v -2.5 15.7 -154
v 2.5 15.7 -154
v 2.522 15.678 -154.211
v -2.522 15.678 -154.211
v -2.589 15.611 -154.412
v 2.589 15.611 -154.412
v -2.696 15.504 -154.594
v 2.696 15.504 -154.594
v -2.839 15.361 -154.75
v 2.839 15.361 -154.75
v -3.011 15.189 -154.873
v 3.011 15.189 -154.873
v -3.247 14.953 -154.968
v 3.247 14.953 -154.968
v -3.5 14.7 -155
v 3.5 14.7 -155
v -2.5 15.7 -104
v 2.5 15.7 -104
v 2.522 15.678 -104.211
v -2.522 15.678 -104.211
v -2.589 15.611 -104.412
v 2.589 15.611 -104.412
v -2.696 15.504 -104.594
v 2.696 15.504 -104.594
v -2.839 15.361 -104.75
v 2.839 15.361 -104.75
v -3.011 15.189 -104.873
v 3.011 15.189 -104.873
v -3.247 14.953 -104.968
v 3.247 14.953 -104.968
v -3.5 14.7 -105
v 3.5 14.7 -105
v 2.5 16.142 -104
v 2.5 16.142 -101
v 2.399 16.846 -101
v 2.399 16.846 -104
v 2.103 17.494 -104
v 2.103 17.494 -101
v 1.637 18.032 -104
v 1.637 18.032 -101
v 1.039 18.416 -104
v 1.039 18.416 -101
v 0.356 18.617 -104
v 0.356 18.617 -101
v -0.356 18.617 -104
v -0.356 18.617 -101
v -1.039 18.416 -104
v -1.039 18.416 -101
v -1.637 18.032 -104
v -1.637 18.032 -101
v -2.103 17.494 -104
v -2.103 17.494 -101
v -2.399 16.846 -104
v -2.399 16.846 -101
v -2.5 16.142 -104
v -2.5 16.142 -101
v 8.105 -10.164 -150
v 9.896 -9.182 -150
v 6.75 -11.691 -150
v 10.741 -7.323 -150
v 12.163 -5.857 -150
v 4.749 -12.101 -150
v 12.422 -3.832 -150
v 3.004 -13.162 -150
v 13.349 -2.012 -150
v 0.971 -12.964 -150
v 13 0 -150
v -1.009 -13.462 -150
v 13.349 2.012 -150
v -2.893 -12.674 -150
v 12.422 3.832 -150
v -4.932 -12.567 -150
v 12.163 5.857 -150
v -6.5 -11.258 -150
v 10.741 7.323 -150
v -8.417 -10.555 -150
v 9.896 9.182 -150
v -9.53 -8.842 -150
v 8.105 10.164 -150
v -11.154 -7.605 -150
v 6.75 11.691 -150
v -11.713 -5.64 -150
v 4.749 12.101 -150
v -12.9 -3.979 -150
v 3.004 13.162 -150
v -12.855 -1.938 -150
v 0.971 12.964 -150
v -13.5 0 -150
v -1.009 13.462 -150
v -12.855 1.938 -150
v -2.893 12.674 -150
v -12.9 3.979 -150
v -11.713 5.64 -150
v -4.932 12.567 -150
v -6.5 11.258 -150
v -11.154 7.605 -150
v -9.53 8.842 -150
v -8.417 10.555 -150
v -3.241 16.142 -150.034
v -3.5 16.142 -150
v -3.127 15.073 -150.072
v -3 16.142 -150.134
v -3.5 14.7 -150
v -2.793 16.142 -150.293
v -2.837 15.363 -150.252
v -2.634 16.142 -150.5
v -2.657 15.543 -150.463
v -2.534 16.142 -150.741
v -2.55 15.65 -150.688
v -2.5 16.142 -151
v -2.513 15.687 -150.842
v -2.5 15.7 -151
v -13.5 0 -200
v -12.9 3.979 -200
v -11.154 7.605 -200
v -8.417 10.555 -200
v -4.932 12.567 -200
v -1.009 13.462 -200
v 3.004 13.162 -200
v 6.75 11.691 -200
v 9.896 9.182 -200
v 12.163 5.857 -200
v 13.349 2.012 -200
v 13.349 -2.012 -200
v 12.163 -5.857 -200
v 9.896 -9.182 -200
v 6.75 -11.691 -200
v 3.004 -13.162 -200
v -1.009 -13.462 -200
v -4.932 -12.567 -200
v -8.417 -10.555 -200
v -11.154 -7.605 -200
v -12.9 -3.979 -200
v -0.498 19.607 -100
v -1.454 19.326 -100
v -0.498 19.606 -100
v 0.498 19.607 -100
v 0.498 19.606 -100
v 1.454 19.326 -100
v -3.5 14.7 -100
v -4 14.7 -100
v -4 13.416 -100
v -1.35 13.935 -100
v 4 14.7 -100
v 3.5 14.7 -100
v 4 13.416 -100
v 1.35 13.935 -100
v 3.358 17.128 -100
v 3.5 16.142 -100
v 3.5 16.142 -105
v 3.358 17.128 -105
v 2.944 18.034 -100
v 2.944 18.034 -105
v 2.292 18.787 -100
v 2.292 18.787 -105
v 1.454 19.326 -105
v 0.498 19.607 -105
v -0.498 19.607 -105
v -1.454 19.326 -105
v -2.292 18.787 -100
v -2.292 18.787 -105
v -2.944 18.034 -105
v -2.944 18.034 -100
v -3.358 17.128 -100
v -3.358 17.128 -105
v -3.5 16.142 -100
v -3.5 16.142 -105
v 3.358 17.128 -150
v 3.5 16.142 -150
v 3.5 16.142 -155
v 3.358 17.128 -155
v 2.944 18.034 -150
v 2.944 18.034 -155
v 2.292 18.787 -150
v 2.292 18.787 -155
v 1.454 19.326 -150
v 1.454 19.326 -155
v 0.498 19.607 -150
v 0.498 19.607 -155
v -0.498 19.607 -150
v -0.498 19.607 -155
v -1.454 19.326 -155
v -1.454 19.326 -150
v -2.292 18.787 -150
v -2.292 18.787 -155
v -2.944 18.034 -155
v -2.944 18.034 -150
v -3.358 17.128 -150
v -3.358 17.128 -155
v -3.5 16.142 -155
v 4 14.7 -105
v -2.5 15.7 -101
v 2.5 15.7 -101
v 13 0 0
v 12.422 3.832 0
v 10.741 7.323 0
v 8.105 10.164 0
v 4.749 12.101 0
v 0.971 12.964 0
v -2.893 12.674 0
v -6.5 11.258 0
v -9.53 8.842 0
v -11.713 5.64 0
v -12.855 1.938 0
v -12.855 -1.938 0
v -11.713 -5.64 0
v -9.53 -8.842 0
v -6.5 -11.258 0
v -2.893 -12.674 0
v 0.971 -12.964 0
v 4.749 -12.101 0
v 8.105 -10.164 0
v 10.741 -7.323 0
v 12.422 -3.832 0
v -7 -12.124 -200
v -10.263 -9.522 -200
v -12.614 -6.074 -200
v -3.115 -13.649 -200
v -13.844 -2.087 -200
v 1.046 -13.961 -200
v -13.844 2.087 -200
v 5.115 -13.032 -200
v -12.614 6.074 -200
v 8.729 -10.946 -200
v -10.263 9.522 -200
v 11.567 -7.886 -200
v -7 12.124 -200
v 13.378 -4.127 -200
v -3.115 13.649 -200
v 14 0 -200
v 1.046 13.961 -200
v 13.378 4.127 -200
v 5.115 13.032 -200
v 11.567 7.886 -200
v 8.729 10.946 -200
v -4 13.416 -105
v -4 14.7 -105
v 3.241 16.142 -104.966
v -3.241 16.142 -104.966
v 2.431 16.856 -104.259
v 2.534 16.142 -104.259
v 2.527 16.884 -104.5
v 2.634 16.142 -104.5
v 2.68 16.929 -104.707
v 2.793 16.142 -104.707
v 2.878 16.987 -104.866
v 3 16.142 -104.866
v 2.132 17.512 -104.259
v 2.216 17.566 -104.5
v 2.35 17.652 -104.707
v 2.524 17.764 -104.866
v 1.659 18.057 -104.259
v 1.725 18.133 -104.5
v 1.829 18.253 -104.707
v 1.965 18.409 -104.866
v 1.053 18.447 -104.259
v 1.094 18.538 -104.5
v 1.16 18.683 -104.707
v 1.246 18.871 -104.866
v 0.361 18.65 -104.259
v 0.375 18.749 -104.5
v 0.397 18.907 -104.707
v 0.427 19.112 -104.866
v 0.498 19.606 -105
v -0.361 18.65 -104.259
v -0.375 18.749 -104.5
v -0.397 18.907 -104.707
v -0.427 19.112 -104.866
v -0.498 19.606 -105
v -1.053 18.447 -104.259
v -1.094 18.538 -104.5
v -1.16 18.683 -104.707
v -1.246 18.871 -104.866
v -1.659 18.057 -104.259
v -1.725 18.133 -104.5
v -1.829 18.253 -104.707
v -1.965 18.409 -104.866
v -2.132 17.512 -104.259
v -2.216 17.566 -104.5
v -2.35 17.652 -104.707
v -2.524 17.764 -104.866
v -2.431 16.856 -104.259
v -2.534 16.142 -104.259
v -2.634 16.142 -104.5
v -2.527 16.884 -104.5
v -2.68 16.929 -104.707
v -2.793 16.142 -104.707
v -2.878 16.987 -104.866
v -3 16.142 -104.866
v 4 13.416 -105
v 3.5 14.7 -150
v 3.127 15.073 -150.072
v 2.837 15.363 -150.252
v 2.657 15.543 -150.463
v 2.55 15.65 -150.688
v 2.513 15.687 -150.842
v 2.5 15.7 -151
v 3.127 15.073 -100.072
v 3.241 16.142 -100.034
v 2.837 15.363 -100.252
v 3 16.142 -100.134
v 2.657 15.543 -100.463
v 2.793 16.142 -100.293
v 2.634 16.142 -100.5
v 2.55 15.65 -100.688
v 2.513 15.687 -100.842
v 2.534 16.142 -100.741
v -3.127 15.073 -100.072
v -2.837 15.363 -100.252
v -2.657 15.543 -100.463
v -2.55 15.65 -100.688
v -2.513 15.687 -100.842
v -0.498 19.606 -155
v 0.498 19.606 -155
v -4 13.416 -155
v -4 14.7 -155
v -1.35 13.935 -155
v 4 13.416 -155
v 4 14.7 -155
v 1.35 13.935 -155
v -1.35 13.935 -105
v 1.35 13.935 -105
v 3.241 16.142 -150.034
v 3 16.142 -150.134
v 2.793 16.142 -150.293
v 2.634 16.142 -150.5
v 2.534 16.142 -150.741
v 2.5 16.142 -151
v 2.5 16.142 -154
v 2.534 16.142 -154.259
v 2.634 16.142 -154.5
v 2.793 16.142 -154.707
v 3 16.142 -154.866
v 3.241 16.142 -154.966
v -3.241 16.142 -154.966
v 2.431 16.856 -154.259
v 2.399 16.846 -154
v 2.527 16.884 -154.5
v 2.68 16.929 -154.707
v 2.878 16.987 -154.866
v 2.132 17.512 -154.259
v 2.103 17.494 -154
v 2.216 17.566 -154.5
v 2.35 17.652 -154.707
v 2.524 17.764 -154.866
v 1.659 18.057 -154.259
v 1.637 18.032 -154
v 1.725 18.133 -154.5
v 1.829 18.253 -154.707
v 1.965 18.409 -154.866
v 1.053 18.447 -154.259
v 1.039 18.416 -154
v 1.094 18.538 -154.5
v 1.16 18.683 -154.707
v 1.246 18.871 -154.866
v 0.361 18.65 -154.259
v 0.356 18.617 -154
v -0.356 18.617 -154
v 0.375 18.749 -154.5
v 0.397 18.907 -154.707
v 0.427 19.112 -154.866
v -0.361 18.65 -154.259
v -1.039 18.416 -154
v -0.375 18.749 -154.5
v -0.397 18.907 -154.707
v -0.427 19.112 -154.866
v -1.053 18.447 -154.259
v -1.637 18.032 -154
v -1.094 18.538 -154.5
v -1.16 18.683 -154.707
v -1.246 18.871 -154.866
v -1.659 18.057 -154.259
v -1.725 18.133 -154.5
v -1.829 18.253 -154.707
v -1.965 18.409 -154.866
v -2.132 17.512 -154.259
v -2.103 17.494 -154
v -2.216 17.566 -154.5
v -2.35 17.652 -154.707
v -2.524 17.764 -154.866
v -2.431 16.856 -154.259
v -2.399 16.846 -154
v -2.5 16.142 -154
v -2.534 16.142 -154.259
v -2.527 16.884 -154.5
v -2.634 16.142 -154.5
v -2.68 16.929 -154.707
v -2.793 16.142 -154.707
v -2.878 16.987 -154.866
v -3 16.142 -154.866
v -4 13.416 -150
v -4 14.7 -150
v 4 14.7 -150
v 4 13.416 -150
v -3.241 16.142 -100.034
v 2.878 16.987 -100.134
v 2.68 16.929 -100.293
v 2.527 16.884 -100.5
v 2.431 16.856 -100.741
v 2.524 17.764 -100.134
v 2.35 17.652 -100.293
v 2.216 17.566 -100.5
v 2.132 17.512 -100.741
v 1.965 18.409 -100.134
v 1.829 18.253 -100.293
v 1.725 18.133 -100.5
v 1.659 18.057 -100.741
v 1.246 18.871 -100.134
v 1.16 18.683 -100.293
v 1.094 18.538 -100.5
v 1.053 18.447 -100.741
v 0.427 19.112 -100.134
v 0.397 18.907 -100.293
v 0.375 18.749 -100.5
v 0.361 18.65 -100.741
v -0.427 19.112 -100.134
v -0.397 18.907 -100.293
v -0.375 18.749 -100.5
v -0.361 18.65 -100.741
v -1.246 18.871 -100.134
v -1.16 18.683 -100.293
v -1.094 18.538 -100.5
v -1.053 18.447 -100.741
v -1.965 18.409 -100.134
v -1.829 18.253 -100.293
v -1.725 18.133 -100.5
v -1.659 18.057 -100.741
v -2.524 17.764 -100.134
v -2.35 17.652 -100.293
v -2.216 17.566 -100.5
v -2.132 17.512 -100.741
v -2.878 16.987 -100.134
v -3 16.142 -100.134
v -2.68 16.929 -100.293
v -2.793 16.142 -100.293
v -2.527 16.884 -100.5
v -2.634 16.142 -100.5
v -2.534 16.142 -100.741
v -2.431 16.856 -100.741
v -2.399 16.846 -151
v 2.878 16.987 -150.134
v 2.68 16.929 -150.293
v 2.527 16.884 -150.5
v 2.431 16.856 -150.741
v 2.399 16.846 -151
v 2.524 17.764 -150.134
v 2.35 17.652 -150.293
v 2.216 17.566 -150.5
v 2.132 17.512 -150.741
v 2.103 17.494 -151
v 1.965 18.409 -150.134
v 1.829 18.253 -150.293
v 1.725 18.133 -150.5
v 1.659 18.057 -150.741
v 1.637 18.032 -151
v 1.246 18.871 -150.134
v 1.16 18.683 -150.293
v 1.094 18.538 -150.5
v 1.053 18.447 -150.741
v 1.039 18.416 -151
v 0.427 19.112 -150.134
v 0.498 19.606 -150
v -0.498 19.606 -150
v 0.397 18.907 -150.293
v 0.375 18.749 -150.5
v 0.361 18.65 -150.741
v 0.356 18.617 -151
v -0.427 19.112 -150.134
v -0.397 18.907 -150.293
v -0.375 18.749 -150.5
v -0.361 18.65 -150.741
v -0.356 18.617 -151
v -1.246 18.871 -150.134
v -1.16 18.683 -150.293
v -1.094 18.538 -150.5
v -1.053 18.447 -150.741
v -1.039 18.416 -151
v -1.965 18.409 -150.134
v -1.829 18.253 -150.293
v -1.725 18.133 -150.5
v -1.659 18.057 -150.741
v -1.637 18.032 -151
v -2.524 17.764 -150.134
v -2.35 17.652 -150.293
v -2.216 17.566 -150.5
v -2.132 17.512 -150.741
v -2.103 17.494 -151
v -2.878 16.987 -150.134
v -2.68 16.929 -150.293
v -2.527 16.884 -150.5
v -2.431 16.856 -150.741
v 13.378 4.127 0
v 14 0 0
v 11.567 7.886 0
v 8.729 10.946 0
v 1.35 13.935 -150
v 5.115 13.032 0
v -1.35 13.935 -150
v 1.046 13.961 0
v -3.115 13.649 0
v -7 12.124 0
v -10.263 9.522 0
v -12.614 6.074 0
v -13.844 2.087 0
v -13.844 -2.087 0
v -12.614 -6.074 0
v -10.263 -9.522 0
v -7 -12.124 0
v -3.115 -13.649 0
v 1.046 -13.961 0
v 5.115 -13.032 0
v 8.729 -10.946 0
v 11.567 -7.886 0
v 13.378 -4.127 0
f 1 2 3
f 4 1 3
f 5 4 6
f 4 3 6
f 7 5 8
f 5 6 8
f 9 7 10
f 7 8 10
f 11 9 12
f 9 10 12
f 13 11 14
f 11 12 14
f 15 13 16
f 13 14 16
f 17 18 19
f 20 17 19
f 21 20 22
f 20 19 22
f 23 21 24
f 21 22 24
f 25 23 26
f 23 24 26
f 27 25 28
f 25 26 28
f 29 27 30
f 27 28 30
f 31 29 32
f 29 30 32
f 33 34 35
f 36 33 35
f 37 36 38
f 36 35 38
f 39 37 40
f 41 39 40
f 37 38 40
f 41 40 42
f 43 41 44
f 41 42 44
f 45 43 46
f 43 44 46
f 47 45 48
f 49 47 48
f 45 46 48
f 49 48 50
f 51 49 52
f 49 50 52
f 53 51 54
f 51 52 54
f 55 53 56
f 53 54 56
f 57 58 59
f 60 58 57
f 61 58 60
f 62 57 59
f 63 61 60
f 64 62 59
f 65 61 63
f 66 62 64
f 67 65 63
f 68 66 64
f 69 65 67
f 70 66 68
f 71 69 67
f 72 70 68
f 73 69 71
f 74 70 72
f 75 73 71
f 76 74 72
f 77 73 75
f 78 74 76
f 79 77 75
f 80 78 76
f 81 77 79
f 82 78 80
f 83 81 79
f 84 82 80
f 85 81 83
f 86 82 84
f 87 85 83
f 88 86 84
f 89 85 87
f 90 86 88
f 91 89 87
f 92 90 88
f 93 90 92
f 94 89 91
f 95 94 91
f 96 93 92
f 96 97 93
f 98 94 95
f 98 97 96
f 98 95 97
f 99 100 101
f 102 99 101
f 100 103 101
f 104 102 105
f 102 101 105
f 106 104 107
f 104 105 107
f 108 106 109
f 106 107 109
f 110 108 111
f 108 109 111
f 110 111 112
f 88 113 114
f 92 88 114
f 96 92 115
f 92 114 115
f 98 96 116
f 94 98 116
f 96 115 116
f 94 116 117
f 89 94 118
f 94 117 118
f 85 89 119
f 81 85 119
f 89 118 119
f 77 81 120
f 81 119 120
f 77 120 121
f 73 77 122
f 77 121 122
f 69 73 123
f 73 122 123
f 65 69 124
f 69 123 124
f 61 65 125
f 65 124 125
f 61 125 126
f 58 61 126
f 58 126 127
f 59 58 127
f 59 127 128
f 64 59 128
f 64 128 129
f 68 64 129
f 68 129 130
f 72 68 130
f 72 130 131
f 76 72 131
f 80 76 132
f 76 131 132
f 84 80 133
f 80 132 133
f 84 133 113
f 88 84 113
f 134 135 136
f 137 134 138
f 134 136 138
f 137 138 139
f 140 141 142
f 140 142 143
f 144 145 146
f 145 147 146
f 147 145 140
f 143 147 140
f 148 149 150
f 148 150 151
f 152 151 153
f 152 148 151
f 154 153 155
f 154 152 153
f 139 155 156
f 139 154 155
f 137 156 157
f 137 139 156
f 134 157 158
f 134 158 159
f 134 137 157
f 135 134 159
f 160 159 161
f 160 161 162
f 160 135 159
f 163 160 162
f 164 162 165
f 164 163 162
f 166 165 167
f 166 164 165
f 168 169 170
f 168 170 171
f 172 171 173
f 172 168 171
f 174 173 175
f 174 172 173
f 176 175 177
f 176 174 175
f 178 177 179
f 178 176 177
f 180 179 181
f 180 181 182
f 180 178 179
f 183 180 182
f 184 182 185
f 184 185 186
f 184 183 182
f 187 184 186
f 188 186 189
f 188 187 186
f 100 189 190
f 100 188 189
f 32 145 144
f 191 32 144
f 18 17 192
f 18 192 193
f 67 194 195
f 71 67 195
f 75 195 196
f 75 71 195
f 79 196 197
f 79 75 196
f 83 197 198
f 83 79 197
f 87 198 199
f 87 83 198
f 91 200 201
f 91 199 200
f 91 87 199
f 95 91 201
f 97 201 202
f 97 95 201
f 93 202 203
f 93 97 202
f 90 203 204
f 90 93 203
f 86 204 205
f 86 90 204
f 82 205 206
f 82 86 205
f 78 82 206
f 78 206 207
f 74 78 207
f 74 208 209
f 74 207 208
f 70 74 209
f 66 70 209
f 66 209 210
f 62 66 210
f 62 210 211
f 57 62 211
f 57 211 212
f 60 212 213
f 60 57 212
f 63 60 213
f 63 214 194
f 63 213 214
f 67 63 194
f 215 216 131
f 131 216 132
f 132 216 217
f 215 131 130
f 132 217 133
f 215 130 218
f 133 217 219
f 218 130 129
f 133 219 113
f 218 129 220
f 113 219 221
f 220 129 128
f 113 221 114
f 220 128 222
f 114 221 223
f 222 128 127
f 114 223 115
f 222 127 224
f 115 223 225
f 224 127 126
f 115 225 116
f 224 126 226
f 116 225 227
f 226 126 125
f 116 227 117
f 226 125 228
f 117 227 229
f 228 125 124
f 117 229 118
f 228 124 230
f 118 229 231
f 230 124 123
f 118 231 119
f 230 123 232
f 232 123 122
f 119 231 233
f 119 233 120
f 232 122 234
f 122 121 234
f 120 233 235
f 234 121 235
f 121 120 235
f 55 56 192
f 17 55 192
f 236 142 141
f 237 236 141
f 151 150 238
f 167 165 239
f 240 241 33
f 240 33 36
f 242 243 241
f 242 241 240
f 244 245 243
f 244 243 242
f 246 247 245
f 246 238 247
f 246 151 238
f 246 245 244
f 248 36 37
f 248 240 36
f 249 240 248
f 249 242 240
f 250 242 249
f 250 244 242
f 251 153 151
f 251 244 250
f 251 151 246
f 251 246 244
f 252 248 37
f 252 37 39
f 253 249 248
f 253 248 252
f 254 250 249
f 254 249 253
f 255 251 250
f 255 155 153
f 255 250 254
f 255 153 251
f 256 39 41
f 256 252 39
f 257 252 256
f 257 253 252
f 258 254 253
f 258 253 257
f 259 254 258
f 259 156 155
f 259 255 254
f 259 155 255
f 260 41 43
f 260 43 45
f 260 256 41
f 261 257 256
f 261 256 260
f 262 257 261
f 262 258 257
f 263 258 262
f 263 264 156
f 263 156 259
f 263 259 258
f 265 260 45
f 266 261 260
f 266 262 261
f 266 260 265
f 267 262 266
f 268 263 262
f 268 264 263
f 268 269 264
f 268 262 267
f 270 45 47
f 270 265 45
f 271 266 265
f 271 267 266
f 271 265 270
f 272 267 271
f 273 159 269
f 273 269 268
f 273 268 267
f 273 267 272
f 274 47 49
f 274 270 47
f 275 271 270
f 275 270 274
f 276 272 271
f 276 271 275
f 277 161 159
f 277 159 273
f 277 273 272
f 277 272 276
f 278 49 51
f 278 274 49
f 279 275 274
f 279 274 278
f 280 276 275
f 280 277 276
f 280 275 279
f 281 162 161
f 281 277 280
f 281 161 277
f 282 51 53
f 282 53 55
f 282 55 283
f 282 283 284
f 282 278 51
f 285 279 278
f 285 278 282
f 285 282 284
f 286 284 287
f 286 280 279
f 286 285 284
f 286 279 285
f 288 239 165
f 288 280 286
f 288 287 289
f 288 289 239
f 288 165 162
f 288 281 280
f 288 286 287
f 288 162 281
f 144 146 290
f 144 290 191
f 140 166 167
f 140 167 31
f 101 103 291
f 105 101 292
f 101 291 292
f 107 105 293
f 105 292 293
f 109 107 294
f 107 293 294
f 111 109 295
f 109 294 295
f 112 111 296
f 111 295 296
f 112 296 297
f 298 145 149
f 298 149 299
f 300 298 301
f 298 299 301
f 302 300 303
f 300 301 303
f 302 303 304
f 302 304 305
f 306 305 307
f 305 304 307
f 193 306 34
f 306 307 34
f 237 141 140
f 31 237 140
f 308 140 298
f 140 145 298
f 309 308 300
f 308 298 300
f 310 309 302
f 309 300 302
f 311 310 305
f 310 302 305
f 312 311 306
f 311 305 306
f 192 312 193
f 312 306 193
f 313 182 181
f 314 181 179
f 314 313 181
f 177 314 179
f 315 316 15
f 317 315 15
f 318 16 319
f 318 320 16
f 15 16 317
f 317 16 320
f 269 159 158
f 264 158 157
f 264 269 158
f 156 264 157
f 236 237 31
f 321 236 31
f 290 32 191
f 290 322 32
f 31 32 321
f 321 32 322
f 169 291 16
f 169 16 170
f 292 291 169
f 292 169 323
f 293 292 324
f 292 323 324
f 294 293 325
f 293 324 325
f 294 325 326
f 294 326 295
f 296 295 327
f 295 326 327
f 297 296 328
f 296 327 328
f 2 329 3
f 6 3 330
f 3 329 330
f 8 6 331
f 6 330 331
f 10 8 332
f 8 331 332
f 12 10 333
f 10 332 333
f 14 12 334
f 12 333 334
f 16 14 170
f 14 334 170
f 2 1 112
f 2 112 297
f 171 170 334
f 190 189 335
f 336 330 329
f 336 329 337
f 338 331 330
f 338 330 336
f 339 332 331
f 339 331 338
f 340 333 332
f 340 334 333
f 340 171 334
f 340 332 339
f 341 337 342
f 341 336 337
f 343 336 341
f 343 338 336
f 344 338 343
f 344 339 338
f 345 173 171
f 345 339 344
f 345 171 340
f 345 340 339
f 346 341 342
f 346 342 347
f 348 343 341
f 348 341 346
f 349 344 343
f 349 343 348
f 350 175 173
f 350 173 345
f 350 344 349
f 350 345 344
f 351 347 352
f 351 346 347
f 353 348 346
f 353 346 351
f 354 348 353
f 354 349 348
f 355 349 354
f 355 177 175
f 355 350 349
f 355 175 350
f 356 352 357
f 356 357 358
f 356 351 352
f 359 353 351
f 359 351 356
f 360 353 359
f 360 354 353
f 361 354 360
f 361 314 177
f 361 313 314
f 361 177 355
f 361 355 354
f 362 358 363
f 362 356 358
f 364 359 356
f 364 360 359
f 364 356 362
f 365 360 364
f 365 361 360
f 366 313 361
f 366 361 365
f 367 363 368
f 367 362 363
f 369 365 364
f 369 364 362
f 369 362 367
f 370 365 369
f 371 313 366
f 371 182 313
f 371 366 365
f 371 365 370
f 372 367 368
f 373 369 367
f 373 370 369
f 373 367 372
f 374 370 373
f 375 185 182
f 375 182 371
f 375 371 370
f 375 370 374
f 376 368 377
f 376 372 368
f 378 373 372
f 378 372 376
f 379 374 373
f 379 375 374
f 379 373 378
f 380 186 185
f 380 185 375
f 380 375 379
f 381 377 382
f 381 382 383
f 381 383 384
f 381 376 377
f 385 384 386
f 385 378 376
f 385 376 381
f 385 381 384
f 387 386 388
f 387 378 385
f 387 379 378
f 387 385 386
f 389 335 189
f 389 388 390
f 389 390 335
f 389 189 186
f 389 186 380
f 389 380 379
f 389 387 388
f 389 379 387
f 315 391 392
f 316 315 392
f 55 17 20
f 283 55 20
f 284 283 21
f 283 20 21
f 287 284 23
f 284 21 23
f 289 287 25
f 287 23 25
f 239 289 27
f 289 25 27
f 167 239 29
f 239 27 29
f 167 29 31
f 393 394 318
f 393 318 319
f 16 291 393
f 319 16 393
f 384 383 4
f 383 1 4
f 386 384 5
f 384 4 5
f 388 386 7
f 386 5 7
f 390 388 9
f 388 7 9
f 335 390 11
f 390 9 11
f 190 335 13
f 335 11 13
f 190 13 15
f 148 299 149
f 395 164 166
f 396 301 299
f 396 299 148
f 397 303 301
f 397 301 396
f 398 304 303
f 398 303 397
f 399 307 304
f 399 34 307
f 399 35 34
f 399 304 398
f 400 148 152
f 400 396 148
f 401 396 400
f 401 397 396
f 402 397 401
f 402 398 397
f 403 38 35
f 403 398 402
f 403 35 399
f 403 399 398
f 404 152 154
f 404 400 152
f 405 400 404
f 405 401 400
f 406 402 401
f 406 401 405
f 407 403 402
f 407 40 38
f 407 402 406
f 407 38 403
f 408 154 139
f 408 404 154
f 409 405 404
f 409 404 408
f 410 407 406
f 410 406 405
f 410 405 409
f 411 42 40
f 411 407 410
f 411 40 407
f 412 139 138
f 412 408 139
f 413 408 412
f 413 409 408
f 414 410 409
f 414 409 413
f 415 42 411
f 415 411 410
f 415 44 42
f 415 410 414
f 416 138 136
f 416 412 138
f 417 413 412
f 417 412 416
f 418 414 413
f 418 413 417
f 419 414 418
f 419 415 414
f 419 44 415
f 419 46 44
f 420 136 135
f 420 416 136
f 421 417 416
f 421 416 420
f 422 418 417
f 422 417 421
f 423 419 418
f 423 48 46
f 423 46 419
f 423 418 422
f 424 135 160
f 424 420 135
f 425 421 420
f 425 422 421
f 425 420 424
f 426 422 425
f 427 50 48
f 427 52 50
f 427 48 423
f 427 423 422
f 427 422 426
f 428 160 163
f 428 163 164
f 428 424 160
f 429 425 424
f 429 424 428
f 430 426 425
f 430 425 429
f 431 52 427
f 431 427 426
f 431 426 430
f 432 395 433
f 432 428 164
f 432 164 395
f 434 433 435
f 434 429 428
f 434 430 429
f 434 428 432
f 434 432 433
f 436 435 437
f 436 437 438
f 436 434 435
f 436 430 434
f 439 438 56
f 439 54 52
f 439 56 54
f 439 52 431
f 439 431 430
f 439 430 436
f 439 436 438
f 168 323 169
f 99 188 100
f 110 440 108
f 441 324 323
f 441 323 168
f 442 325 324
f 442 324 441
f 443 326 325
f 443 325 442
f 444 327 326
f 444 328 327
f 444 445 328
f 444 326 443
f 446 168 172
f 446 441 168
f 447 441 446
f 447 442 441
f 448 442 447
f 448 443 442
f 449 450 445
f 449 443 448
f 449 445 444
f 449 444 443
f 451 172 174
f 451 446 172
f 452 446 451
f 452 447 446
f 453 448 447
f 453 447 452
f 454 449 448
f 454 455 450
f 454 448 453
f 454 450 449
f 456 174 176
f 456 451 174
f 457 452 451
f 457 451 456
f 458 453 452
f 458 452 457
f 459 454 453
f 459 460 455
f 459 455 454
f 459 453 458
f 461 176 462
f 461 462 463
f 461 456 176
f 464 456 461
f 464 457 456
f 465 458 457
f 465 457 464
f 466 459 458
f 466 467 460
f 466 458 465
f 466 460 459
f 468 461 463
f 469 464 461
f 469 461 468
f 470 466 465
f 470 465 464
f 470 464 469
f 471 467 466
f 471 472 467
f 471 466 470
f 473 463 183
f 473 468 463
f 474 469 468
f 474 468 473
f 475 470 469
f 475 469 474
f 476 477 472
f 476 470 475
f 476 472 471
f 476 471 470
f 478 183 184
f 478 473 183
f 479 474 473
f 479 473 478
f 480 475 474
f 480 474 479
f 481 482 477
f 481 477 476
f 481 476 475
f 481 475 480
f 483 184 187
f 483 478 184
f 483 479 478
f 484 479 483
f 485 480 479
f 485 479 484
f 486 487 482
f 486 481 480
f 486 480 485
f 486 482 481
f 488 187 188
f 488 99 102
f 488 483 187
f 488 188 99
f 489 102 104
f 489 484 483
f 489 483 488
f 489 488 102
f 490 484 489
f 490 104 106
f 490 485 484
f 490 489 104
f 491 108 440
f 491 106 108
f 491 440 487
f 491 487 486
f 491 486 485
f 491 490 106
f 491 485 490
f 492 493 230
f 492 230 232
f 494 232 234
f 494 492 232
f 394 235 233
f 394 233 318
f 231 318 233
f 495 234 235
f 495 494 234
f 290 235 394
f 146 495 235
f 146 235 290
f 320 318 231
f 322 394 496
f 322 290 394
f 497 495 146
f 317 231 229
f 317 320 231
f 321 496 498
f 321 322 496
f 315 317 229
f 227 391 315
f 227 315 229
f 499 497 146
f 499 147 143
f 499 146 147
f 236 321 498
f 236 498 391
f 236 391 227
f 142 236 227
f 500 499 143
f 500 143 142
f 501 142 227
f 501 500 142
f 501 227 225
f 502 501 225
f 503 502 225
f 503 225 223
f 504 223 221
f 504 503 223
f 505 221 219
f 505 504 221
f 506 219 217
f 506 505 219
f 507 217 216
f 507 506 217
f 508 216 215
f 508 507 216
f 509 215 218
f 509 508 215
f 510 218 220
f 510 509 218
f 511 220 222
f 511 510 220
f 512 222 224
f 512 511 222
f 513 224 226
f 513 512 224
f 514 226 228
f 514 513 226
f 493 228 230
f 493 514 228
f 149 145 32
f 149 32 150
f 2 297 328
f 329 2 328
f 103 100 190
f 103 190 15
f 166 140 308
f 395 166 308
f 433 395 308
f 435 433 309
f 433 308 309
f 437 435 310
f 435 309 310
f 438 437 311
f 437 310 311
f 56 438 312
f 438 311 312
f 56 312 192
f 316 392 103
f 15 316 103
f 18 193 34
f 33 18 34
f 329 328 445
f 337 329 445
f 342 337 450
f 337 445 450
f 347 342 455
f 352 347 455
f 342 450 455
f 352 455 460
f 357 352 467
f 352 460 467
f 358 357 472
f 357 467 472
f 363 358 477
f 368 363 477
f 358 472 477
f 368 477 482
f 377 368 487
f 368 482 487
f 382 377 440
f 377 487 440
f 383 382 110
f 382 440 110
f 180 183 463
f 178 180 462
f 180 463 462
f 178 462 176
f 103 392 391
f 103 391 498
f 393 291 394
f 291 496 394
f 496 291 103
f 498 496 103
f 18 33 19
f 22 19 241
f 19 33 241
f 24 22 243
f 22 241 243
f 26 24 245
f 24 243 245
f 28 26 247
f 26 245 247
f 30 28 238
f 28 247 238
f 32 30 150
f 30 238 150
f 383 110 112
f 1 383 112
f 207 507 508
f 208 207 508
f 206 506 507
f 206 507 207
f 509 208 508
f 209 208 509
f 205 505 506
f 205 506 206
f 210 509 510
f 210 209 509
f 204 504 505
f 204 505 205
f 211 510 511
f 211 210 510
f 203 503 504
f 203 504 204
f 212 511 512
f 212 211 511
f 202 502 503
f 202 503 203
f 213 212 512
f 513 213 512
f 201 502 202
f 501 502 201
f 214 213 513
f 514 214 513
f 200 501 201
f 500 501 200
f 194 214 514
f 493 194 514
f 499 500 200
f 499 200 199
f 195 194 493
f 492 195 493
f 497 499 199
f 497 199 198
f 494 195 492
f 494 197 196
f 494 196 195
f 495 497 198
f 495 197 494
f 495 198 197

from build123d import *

# Parameters (mm, degrees)
CROQUIS1_R                 = 14
SALIENTE_EXTRUIR1_DEPTH    = 200
CORTAR_EXTRUIR1_DEPTH      = 201.977610693
CORTAR_EXTRUIR1_DEPTH_BACK = 201.977610693
CROQUIS2_R                 = 13
CROQUIS3_W                 = 8
CROQUIS3_H                 = 1.4
SALIENTE_EXTRUIR2_DEPTH    = 5
EXTRUIR_L_MINA2_DEPTH      = 5
CROQUIS6_W                 = 5
CROQUIS6_H                 = 5
SALIENTE_EXTRUIR3_DEPTH    = 1
REDONDEO1_R                = 1
MATRIZL2_COUNT             = 2
MATRIZL2_PITCH             = 50
REDONDEO1_OF_MATRIZL2_R    = 1
CROQUIS8_R                 = 13.5
CORTAR_EXTRUIR2_DEPTH      = 50


with BuildPart() as part:
    # Croquis1 → Saliente-Extruir1 (new body)
    with BuildSketch(Plane.XY):
        Circle(CROQUIS1_R)
    extrude(amount=-SALIENTE_EXTRUIR1_DEPTH)

    # Croquis2 → Cortar-Extruir1 (cut, two sides: drawn at the far end of the back side and taken through both)
    with BuildSketch(Plane.XY.offset(-CORTAR_EXTRUIR1_DEPTH_BACK)):
        Circle(CROQUIS2_R)
    extrude(amount=CORTAR_EXTRUIR1_DEPTH + CORTAR_EXTRUIR1_DEPTH_BACK, mode=Mode.SUBTRACT)

    # Croquis3 → Saliente-Extruir2 (add)
    with BuildSketch(Plane.XY.offset(-100)):
        with Locations((0, 14)):
            Rectangle(CROQUIS3_W, CROQUIS3_H)
    saliente_extruir2 = extrude(amount=-SALIENTE_EXTRUIR2_DEPTH)

    # Croquis5 → Extruir-Lámina2 (add)
    with BuildSketch(Plane.XY.offset(-100)):
        with BuildLine():
            Line((-3.5, 16.142129337), (-3.5, 15.7))
            Line((-3.5, 15.7), (-3.5, 13.7))
            Line((-3.5, 13.7), (3.5, 13.7))
            Line((3.5, 13.7), (3.5, 16.142129337))
            ThreePointArc((3.5, 16.142129337), (0, 19.642129337), (-3.5, 16.142129337))
        make_face()
        with BuildLine():
            Line((-2.5, 16.142129337), (-2.5, 15.7))
            Line((-2.5, 15.7), (-2.5, 14.7))
            Line((-2.5, 14.7), (2.5, 14.7))
            Line((2.5, 14.7), (2.5, 16.142129337))
            ThreePointArc((2.5, 16.142129337), (0, 18.642129337), (-2.5, 16.142129337))
        make_face(mode=Mode.SUBTRACT)
    extruir_l_mina2 = extrude(amount=-EXTRUIR_L_MINA2_DEPTH)

    # Croquis6 → Saliente-Extruir3 (add)
    with BuildSketch(Plane(origin=(0, 14.7, 0), x_dir=(1, 0, 0), z_dir=(0, 1, 0))):
        with Locations((0, 102.5)):
            Rectangle(CROQUIS6_W, CROQUIS6_H)
    saliente_extruir3 = extrude(amount=SALIENTE_EXTRUIR3_DEPTH)

    # Redondeo1
    redondeo1_edges = [part.edges().sort_by_distance(p)[0] for p in [
        (-2.5, 15.921064668, -100),
        (0, 18.642129337, -100),
        (0, 18.642129337, -105),
        (-2.5, 15.921064668, -105),
        (2.5, 15.921064668, -105),
        (2.5, 15.921064668, -100),
        (0, 15.7, -105),
        (0, 15.7, -100),
    ]]
    fillet(redondeo1_edges, radius=REDONDEO1_R - 0.0001)  # a hair under: the kernel refuses the full size

    # MatrizL2: Saliente-Extruir2, Extruir-Lámina2, Saliente-Extruir3 ×2
    with Locations(*[(0, 0, -i * MATRIZL2_PITCH) for i in range(1, MATRIZL2_COUNT)]):
        add(saliente_extruir2)
        add(extruir_l_mina2)
        add(saliente_extruir3)

    # Redondeo1 of MatrizL2
    redondeo1_of_matrizl2_edges = [part.edges().sort_by_distance(p)[0] for p in [
        (-2.5, 15.921064668, -150),
        (0, 18.642129337, -150),
        (0, 18.642129337, -155),
        (-2.5, 15.921064668, -155),
        (2.5, 15.921064668, -155),
        (2.5, 15.921064668, -150),
        (0, 15.7, -155),
        (0, 15.7, -150),
    ]]
    fillet(redondeo1_of_matrizl2_edges, radius=REDONDEO1_OF_MATRIZL2_R - 0.0001)  # a hair under: the kernel refuses the full size

    # Croquis8 → Cortar-Extruir2 (cut)
    with BuildSketch(Plane(origin=(0, 0, -200), x_dir=(-1, 0, 0), z_dir=(0, 0, -1))):
        Circle(CROQUIS8_R)
    extrude(amount=-CORTAR_EXTRUIR2_DEPTH, mode=Mode.SUBTRACT)


solid = part.part
